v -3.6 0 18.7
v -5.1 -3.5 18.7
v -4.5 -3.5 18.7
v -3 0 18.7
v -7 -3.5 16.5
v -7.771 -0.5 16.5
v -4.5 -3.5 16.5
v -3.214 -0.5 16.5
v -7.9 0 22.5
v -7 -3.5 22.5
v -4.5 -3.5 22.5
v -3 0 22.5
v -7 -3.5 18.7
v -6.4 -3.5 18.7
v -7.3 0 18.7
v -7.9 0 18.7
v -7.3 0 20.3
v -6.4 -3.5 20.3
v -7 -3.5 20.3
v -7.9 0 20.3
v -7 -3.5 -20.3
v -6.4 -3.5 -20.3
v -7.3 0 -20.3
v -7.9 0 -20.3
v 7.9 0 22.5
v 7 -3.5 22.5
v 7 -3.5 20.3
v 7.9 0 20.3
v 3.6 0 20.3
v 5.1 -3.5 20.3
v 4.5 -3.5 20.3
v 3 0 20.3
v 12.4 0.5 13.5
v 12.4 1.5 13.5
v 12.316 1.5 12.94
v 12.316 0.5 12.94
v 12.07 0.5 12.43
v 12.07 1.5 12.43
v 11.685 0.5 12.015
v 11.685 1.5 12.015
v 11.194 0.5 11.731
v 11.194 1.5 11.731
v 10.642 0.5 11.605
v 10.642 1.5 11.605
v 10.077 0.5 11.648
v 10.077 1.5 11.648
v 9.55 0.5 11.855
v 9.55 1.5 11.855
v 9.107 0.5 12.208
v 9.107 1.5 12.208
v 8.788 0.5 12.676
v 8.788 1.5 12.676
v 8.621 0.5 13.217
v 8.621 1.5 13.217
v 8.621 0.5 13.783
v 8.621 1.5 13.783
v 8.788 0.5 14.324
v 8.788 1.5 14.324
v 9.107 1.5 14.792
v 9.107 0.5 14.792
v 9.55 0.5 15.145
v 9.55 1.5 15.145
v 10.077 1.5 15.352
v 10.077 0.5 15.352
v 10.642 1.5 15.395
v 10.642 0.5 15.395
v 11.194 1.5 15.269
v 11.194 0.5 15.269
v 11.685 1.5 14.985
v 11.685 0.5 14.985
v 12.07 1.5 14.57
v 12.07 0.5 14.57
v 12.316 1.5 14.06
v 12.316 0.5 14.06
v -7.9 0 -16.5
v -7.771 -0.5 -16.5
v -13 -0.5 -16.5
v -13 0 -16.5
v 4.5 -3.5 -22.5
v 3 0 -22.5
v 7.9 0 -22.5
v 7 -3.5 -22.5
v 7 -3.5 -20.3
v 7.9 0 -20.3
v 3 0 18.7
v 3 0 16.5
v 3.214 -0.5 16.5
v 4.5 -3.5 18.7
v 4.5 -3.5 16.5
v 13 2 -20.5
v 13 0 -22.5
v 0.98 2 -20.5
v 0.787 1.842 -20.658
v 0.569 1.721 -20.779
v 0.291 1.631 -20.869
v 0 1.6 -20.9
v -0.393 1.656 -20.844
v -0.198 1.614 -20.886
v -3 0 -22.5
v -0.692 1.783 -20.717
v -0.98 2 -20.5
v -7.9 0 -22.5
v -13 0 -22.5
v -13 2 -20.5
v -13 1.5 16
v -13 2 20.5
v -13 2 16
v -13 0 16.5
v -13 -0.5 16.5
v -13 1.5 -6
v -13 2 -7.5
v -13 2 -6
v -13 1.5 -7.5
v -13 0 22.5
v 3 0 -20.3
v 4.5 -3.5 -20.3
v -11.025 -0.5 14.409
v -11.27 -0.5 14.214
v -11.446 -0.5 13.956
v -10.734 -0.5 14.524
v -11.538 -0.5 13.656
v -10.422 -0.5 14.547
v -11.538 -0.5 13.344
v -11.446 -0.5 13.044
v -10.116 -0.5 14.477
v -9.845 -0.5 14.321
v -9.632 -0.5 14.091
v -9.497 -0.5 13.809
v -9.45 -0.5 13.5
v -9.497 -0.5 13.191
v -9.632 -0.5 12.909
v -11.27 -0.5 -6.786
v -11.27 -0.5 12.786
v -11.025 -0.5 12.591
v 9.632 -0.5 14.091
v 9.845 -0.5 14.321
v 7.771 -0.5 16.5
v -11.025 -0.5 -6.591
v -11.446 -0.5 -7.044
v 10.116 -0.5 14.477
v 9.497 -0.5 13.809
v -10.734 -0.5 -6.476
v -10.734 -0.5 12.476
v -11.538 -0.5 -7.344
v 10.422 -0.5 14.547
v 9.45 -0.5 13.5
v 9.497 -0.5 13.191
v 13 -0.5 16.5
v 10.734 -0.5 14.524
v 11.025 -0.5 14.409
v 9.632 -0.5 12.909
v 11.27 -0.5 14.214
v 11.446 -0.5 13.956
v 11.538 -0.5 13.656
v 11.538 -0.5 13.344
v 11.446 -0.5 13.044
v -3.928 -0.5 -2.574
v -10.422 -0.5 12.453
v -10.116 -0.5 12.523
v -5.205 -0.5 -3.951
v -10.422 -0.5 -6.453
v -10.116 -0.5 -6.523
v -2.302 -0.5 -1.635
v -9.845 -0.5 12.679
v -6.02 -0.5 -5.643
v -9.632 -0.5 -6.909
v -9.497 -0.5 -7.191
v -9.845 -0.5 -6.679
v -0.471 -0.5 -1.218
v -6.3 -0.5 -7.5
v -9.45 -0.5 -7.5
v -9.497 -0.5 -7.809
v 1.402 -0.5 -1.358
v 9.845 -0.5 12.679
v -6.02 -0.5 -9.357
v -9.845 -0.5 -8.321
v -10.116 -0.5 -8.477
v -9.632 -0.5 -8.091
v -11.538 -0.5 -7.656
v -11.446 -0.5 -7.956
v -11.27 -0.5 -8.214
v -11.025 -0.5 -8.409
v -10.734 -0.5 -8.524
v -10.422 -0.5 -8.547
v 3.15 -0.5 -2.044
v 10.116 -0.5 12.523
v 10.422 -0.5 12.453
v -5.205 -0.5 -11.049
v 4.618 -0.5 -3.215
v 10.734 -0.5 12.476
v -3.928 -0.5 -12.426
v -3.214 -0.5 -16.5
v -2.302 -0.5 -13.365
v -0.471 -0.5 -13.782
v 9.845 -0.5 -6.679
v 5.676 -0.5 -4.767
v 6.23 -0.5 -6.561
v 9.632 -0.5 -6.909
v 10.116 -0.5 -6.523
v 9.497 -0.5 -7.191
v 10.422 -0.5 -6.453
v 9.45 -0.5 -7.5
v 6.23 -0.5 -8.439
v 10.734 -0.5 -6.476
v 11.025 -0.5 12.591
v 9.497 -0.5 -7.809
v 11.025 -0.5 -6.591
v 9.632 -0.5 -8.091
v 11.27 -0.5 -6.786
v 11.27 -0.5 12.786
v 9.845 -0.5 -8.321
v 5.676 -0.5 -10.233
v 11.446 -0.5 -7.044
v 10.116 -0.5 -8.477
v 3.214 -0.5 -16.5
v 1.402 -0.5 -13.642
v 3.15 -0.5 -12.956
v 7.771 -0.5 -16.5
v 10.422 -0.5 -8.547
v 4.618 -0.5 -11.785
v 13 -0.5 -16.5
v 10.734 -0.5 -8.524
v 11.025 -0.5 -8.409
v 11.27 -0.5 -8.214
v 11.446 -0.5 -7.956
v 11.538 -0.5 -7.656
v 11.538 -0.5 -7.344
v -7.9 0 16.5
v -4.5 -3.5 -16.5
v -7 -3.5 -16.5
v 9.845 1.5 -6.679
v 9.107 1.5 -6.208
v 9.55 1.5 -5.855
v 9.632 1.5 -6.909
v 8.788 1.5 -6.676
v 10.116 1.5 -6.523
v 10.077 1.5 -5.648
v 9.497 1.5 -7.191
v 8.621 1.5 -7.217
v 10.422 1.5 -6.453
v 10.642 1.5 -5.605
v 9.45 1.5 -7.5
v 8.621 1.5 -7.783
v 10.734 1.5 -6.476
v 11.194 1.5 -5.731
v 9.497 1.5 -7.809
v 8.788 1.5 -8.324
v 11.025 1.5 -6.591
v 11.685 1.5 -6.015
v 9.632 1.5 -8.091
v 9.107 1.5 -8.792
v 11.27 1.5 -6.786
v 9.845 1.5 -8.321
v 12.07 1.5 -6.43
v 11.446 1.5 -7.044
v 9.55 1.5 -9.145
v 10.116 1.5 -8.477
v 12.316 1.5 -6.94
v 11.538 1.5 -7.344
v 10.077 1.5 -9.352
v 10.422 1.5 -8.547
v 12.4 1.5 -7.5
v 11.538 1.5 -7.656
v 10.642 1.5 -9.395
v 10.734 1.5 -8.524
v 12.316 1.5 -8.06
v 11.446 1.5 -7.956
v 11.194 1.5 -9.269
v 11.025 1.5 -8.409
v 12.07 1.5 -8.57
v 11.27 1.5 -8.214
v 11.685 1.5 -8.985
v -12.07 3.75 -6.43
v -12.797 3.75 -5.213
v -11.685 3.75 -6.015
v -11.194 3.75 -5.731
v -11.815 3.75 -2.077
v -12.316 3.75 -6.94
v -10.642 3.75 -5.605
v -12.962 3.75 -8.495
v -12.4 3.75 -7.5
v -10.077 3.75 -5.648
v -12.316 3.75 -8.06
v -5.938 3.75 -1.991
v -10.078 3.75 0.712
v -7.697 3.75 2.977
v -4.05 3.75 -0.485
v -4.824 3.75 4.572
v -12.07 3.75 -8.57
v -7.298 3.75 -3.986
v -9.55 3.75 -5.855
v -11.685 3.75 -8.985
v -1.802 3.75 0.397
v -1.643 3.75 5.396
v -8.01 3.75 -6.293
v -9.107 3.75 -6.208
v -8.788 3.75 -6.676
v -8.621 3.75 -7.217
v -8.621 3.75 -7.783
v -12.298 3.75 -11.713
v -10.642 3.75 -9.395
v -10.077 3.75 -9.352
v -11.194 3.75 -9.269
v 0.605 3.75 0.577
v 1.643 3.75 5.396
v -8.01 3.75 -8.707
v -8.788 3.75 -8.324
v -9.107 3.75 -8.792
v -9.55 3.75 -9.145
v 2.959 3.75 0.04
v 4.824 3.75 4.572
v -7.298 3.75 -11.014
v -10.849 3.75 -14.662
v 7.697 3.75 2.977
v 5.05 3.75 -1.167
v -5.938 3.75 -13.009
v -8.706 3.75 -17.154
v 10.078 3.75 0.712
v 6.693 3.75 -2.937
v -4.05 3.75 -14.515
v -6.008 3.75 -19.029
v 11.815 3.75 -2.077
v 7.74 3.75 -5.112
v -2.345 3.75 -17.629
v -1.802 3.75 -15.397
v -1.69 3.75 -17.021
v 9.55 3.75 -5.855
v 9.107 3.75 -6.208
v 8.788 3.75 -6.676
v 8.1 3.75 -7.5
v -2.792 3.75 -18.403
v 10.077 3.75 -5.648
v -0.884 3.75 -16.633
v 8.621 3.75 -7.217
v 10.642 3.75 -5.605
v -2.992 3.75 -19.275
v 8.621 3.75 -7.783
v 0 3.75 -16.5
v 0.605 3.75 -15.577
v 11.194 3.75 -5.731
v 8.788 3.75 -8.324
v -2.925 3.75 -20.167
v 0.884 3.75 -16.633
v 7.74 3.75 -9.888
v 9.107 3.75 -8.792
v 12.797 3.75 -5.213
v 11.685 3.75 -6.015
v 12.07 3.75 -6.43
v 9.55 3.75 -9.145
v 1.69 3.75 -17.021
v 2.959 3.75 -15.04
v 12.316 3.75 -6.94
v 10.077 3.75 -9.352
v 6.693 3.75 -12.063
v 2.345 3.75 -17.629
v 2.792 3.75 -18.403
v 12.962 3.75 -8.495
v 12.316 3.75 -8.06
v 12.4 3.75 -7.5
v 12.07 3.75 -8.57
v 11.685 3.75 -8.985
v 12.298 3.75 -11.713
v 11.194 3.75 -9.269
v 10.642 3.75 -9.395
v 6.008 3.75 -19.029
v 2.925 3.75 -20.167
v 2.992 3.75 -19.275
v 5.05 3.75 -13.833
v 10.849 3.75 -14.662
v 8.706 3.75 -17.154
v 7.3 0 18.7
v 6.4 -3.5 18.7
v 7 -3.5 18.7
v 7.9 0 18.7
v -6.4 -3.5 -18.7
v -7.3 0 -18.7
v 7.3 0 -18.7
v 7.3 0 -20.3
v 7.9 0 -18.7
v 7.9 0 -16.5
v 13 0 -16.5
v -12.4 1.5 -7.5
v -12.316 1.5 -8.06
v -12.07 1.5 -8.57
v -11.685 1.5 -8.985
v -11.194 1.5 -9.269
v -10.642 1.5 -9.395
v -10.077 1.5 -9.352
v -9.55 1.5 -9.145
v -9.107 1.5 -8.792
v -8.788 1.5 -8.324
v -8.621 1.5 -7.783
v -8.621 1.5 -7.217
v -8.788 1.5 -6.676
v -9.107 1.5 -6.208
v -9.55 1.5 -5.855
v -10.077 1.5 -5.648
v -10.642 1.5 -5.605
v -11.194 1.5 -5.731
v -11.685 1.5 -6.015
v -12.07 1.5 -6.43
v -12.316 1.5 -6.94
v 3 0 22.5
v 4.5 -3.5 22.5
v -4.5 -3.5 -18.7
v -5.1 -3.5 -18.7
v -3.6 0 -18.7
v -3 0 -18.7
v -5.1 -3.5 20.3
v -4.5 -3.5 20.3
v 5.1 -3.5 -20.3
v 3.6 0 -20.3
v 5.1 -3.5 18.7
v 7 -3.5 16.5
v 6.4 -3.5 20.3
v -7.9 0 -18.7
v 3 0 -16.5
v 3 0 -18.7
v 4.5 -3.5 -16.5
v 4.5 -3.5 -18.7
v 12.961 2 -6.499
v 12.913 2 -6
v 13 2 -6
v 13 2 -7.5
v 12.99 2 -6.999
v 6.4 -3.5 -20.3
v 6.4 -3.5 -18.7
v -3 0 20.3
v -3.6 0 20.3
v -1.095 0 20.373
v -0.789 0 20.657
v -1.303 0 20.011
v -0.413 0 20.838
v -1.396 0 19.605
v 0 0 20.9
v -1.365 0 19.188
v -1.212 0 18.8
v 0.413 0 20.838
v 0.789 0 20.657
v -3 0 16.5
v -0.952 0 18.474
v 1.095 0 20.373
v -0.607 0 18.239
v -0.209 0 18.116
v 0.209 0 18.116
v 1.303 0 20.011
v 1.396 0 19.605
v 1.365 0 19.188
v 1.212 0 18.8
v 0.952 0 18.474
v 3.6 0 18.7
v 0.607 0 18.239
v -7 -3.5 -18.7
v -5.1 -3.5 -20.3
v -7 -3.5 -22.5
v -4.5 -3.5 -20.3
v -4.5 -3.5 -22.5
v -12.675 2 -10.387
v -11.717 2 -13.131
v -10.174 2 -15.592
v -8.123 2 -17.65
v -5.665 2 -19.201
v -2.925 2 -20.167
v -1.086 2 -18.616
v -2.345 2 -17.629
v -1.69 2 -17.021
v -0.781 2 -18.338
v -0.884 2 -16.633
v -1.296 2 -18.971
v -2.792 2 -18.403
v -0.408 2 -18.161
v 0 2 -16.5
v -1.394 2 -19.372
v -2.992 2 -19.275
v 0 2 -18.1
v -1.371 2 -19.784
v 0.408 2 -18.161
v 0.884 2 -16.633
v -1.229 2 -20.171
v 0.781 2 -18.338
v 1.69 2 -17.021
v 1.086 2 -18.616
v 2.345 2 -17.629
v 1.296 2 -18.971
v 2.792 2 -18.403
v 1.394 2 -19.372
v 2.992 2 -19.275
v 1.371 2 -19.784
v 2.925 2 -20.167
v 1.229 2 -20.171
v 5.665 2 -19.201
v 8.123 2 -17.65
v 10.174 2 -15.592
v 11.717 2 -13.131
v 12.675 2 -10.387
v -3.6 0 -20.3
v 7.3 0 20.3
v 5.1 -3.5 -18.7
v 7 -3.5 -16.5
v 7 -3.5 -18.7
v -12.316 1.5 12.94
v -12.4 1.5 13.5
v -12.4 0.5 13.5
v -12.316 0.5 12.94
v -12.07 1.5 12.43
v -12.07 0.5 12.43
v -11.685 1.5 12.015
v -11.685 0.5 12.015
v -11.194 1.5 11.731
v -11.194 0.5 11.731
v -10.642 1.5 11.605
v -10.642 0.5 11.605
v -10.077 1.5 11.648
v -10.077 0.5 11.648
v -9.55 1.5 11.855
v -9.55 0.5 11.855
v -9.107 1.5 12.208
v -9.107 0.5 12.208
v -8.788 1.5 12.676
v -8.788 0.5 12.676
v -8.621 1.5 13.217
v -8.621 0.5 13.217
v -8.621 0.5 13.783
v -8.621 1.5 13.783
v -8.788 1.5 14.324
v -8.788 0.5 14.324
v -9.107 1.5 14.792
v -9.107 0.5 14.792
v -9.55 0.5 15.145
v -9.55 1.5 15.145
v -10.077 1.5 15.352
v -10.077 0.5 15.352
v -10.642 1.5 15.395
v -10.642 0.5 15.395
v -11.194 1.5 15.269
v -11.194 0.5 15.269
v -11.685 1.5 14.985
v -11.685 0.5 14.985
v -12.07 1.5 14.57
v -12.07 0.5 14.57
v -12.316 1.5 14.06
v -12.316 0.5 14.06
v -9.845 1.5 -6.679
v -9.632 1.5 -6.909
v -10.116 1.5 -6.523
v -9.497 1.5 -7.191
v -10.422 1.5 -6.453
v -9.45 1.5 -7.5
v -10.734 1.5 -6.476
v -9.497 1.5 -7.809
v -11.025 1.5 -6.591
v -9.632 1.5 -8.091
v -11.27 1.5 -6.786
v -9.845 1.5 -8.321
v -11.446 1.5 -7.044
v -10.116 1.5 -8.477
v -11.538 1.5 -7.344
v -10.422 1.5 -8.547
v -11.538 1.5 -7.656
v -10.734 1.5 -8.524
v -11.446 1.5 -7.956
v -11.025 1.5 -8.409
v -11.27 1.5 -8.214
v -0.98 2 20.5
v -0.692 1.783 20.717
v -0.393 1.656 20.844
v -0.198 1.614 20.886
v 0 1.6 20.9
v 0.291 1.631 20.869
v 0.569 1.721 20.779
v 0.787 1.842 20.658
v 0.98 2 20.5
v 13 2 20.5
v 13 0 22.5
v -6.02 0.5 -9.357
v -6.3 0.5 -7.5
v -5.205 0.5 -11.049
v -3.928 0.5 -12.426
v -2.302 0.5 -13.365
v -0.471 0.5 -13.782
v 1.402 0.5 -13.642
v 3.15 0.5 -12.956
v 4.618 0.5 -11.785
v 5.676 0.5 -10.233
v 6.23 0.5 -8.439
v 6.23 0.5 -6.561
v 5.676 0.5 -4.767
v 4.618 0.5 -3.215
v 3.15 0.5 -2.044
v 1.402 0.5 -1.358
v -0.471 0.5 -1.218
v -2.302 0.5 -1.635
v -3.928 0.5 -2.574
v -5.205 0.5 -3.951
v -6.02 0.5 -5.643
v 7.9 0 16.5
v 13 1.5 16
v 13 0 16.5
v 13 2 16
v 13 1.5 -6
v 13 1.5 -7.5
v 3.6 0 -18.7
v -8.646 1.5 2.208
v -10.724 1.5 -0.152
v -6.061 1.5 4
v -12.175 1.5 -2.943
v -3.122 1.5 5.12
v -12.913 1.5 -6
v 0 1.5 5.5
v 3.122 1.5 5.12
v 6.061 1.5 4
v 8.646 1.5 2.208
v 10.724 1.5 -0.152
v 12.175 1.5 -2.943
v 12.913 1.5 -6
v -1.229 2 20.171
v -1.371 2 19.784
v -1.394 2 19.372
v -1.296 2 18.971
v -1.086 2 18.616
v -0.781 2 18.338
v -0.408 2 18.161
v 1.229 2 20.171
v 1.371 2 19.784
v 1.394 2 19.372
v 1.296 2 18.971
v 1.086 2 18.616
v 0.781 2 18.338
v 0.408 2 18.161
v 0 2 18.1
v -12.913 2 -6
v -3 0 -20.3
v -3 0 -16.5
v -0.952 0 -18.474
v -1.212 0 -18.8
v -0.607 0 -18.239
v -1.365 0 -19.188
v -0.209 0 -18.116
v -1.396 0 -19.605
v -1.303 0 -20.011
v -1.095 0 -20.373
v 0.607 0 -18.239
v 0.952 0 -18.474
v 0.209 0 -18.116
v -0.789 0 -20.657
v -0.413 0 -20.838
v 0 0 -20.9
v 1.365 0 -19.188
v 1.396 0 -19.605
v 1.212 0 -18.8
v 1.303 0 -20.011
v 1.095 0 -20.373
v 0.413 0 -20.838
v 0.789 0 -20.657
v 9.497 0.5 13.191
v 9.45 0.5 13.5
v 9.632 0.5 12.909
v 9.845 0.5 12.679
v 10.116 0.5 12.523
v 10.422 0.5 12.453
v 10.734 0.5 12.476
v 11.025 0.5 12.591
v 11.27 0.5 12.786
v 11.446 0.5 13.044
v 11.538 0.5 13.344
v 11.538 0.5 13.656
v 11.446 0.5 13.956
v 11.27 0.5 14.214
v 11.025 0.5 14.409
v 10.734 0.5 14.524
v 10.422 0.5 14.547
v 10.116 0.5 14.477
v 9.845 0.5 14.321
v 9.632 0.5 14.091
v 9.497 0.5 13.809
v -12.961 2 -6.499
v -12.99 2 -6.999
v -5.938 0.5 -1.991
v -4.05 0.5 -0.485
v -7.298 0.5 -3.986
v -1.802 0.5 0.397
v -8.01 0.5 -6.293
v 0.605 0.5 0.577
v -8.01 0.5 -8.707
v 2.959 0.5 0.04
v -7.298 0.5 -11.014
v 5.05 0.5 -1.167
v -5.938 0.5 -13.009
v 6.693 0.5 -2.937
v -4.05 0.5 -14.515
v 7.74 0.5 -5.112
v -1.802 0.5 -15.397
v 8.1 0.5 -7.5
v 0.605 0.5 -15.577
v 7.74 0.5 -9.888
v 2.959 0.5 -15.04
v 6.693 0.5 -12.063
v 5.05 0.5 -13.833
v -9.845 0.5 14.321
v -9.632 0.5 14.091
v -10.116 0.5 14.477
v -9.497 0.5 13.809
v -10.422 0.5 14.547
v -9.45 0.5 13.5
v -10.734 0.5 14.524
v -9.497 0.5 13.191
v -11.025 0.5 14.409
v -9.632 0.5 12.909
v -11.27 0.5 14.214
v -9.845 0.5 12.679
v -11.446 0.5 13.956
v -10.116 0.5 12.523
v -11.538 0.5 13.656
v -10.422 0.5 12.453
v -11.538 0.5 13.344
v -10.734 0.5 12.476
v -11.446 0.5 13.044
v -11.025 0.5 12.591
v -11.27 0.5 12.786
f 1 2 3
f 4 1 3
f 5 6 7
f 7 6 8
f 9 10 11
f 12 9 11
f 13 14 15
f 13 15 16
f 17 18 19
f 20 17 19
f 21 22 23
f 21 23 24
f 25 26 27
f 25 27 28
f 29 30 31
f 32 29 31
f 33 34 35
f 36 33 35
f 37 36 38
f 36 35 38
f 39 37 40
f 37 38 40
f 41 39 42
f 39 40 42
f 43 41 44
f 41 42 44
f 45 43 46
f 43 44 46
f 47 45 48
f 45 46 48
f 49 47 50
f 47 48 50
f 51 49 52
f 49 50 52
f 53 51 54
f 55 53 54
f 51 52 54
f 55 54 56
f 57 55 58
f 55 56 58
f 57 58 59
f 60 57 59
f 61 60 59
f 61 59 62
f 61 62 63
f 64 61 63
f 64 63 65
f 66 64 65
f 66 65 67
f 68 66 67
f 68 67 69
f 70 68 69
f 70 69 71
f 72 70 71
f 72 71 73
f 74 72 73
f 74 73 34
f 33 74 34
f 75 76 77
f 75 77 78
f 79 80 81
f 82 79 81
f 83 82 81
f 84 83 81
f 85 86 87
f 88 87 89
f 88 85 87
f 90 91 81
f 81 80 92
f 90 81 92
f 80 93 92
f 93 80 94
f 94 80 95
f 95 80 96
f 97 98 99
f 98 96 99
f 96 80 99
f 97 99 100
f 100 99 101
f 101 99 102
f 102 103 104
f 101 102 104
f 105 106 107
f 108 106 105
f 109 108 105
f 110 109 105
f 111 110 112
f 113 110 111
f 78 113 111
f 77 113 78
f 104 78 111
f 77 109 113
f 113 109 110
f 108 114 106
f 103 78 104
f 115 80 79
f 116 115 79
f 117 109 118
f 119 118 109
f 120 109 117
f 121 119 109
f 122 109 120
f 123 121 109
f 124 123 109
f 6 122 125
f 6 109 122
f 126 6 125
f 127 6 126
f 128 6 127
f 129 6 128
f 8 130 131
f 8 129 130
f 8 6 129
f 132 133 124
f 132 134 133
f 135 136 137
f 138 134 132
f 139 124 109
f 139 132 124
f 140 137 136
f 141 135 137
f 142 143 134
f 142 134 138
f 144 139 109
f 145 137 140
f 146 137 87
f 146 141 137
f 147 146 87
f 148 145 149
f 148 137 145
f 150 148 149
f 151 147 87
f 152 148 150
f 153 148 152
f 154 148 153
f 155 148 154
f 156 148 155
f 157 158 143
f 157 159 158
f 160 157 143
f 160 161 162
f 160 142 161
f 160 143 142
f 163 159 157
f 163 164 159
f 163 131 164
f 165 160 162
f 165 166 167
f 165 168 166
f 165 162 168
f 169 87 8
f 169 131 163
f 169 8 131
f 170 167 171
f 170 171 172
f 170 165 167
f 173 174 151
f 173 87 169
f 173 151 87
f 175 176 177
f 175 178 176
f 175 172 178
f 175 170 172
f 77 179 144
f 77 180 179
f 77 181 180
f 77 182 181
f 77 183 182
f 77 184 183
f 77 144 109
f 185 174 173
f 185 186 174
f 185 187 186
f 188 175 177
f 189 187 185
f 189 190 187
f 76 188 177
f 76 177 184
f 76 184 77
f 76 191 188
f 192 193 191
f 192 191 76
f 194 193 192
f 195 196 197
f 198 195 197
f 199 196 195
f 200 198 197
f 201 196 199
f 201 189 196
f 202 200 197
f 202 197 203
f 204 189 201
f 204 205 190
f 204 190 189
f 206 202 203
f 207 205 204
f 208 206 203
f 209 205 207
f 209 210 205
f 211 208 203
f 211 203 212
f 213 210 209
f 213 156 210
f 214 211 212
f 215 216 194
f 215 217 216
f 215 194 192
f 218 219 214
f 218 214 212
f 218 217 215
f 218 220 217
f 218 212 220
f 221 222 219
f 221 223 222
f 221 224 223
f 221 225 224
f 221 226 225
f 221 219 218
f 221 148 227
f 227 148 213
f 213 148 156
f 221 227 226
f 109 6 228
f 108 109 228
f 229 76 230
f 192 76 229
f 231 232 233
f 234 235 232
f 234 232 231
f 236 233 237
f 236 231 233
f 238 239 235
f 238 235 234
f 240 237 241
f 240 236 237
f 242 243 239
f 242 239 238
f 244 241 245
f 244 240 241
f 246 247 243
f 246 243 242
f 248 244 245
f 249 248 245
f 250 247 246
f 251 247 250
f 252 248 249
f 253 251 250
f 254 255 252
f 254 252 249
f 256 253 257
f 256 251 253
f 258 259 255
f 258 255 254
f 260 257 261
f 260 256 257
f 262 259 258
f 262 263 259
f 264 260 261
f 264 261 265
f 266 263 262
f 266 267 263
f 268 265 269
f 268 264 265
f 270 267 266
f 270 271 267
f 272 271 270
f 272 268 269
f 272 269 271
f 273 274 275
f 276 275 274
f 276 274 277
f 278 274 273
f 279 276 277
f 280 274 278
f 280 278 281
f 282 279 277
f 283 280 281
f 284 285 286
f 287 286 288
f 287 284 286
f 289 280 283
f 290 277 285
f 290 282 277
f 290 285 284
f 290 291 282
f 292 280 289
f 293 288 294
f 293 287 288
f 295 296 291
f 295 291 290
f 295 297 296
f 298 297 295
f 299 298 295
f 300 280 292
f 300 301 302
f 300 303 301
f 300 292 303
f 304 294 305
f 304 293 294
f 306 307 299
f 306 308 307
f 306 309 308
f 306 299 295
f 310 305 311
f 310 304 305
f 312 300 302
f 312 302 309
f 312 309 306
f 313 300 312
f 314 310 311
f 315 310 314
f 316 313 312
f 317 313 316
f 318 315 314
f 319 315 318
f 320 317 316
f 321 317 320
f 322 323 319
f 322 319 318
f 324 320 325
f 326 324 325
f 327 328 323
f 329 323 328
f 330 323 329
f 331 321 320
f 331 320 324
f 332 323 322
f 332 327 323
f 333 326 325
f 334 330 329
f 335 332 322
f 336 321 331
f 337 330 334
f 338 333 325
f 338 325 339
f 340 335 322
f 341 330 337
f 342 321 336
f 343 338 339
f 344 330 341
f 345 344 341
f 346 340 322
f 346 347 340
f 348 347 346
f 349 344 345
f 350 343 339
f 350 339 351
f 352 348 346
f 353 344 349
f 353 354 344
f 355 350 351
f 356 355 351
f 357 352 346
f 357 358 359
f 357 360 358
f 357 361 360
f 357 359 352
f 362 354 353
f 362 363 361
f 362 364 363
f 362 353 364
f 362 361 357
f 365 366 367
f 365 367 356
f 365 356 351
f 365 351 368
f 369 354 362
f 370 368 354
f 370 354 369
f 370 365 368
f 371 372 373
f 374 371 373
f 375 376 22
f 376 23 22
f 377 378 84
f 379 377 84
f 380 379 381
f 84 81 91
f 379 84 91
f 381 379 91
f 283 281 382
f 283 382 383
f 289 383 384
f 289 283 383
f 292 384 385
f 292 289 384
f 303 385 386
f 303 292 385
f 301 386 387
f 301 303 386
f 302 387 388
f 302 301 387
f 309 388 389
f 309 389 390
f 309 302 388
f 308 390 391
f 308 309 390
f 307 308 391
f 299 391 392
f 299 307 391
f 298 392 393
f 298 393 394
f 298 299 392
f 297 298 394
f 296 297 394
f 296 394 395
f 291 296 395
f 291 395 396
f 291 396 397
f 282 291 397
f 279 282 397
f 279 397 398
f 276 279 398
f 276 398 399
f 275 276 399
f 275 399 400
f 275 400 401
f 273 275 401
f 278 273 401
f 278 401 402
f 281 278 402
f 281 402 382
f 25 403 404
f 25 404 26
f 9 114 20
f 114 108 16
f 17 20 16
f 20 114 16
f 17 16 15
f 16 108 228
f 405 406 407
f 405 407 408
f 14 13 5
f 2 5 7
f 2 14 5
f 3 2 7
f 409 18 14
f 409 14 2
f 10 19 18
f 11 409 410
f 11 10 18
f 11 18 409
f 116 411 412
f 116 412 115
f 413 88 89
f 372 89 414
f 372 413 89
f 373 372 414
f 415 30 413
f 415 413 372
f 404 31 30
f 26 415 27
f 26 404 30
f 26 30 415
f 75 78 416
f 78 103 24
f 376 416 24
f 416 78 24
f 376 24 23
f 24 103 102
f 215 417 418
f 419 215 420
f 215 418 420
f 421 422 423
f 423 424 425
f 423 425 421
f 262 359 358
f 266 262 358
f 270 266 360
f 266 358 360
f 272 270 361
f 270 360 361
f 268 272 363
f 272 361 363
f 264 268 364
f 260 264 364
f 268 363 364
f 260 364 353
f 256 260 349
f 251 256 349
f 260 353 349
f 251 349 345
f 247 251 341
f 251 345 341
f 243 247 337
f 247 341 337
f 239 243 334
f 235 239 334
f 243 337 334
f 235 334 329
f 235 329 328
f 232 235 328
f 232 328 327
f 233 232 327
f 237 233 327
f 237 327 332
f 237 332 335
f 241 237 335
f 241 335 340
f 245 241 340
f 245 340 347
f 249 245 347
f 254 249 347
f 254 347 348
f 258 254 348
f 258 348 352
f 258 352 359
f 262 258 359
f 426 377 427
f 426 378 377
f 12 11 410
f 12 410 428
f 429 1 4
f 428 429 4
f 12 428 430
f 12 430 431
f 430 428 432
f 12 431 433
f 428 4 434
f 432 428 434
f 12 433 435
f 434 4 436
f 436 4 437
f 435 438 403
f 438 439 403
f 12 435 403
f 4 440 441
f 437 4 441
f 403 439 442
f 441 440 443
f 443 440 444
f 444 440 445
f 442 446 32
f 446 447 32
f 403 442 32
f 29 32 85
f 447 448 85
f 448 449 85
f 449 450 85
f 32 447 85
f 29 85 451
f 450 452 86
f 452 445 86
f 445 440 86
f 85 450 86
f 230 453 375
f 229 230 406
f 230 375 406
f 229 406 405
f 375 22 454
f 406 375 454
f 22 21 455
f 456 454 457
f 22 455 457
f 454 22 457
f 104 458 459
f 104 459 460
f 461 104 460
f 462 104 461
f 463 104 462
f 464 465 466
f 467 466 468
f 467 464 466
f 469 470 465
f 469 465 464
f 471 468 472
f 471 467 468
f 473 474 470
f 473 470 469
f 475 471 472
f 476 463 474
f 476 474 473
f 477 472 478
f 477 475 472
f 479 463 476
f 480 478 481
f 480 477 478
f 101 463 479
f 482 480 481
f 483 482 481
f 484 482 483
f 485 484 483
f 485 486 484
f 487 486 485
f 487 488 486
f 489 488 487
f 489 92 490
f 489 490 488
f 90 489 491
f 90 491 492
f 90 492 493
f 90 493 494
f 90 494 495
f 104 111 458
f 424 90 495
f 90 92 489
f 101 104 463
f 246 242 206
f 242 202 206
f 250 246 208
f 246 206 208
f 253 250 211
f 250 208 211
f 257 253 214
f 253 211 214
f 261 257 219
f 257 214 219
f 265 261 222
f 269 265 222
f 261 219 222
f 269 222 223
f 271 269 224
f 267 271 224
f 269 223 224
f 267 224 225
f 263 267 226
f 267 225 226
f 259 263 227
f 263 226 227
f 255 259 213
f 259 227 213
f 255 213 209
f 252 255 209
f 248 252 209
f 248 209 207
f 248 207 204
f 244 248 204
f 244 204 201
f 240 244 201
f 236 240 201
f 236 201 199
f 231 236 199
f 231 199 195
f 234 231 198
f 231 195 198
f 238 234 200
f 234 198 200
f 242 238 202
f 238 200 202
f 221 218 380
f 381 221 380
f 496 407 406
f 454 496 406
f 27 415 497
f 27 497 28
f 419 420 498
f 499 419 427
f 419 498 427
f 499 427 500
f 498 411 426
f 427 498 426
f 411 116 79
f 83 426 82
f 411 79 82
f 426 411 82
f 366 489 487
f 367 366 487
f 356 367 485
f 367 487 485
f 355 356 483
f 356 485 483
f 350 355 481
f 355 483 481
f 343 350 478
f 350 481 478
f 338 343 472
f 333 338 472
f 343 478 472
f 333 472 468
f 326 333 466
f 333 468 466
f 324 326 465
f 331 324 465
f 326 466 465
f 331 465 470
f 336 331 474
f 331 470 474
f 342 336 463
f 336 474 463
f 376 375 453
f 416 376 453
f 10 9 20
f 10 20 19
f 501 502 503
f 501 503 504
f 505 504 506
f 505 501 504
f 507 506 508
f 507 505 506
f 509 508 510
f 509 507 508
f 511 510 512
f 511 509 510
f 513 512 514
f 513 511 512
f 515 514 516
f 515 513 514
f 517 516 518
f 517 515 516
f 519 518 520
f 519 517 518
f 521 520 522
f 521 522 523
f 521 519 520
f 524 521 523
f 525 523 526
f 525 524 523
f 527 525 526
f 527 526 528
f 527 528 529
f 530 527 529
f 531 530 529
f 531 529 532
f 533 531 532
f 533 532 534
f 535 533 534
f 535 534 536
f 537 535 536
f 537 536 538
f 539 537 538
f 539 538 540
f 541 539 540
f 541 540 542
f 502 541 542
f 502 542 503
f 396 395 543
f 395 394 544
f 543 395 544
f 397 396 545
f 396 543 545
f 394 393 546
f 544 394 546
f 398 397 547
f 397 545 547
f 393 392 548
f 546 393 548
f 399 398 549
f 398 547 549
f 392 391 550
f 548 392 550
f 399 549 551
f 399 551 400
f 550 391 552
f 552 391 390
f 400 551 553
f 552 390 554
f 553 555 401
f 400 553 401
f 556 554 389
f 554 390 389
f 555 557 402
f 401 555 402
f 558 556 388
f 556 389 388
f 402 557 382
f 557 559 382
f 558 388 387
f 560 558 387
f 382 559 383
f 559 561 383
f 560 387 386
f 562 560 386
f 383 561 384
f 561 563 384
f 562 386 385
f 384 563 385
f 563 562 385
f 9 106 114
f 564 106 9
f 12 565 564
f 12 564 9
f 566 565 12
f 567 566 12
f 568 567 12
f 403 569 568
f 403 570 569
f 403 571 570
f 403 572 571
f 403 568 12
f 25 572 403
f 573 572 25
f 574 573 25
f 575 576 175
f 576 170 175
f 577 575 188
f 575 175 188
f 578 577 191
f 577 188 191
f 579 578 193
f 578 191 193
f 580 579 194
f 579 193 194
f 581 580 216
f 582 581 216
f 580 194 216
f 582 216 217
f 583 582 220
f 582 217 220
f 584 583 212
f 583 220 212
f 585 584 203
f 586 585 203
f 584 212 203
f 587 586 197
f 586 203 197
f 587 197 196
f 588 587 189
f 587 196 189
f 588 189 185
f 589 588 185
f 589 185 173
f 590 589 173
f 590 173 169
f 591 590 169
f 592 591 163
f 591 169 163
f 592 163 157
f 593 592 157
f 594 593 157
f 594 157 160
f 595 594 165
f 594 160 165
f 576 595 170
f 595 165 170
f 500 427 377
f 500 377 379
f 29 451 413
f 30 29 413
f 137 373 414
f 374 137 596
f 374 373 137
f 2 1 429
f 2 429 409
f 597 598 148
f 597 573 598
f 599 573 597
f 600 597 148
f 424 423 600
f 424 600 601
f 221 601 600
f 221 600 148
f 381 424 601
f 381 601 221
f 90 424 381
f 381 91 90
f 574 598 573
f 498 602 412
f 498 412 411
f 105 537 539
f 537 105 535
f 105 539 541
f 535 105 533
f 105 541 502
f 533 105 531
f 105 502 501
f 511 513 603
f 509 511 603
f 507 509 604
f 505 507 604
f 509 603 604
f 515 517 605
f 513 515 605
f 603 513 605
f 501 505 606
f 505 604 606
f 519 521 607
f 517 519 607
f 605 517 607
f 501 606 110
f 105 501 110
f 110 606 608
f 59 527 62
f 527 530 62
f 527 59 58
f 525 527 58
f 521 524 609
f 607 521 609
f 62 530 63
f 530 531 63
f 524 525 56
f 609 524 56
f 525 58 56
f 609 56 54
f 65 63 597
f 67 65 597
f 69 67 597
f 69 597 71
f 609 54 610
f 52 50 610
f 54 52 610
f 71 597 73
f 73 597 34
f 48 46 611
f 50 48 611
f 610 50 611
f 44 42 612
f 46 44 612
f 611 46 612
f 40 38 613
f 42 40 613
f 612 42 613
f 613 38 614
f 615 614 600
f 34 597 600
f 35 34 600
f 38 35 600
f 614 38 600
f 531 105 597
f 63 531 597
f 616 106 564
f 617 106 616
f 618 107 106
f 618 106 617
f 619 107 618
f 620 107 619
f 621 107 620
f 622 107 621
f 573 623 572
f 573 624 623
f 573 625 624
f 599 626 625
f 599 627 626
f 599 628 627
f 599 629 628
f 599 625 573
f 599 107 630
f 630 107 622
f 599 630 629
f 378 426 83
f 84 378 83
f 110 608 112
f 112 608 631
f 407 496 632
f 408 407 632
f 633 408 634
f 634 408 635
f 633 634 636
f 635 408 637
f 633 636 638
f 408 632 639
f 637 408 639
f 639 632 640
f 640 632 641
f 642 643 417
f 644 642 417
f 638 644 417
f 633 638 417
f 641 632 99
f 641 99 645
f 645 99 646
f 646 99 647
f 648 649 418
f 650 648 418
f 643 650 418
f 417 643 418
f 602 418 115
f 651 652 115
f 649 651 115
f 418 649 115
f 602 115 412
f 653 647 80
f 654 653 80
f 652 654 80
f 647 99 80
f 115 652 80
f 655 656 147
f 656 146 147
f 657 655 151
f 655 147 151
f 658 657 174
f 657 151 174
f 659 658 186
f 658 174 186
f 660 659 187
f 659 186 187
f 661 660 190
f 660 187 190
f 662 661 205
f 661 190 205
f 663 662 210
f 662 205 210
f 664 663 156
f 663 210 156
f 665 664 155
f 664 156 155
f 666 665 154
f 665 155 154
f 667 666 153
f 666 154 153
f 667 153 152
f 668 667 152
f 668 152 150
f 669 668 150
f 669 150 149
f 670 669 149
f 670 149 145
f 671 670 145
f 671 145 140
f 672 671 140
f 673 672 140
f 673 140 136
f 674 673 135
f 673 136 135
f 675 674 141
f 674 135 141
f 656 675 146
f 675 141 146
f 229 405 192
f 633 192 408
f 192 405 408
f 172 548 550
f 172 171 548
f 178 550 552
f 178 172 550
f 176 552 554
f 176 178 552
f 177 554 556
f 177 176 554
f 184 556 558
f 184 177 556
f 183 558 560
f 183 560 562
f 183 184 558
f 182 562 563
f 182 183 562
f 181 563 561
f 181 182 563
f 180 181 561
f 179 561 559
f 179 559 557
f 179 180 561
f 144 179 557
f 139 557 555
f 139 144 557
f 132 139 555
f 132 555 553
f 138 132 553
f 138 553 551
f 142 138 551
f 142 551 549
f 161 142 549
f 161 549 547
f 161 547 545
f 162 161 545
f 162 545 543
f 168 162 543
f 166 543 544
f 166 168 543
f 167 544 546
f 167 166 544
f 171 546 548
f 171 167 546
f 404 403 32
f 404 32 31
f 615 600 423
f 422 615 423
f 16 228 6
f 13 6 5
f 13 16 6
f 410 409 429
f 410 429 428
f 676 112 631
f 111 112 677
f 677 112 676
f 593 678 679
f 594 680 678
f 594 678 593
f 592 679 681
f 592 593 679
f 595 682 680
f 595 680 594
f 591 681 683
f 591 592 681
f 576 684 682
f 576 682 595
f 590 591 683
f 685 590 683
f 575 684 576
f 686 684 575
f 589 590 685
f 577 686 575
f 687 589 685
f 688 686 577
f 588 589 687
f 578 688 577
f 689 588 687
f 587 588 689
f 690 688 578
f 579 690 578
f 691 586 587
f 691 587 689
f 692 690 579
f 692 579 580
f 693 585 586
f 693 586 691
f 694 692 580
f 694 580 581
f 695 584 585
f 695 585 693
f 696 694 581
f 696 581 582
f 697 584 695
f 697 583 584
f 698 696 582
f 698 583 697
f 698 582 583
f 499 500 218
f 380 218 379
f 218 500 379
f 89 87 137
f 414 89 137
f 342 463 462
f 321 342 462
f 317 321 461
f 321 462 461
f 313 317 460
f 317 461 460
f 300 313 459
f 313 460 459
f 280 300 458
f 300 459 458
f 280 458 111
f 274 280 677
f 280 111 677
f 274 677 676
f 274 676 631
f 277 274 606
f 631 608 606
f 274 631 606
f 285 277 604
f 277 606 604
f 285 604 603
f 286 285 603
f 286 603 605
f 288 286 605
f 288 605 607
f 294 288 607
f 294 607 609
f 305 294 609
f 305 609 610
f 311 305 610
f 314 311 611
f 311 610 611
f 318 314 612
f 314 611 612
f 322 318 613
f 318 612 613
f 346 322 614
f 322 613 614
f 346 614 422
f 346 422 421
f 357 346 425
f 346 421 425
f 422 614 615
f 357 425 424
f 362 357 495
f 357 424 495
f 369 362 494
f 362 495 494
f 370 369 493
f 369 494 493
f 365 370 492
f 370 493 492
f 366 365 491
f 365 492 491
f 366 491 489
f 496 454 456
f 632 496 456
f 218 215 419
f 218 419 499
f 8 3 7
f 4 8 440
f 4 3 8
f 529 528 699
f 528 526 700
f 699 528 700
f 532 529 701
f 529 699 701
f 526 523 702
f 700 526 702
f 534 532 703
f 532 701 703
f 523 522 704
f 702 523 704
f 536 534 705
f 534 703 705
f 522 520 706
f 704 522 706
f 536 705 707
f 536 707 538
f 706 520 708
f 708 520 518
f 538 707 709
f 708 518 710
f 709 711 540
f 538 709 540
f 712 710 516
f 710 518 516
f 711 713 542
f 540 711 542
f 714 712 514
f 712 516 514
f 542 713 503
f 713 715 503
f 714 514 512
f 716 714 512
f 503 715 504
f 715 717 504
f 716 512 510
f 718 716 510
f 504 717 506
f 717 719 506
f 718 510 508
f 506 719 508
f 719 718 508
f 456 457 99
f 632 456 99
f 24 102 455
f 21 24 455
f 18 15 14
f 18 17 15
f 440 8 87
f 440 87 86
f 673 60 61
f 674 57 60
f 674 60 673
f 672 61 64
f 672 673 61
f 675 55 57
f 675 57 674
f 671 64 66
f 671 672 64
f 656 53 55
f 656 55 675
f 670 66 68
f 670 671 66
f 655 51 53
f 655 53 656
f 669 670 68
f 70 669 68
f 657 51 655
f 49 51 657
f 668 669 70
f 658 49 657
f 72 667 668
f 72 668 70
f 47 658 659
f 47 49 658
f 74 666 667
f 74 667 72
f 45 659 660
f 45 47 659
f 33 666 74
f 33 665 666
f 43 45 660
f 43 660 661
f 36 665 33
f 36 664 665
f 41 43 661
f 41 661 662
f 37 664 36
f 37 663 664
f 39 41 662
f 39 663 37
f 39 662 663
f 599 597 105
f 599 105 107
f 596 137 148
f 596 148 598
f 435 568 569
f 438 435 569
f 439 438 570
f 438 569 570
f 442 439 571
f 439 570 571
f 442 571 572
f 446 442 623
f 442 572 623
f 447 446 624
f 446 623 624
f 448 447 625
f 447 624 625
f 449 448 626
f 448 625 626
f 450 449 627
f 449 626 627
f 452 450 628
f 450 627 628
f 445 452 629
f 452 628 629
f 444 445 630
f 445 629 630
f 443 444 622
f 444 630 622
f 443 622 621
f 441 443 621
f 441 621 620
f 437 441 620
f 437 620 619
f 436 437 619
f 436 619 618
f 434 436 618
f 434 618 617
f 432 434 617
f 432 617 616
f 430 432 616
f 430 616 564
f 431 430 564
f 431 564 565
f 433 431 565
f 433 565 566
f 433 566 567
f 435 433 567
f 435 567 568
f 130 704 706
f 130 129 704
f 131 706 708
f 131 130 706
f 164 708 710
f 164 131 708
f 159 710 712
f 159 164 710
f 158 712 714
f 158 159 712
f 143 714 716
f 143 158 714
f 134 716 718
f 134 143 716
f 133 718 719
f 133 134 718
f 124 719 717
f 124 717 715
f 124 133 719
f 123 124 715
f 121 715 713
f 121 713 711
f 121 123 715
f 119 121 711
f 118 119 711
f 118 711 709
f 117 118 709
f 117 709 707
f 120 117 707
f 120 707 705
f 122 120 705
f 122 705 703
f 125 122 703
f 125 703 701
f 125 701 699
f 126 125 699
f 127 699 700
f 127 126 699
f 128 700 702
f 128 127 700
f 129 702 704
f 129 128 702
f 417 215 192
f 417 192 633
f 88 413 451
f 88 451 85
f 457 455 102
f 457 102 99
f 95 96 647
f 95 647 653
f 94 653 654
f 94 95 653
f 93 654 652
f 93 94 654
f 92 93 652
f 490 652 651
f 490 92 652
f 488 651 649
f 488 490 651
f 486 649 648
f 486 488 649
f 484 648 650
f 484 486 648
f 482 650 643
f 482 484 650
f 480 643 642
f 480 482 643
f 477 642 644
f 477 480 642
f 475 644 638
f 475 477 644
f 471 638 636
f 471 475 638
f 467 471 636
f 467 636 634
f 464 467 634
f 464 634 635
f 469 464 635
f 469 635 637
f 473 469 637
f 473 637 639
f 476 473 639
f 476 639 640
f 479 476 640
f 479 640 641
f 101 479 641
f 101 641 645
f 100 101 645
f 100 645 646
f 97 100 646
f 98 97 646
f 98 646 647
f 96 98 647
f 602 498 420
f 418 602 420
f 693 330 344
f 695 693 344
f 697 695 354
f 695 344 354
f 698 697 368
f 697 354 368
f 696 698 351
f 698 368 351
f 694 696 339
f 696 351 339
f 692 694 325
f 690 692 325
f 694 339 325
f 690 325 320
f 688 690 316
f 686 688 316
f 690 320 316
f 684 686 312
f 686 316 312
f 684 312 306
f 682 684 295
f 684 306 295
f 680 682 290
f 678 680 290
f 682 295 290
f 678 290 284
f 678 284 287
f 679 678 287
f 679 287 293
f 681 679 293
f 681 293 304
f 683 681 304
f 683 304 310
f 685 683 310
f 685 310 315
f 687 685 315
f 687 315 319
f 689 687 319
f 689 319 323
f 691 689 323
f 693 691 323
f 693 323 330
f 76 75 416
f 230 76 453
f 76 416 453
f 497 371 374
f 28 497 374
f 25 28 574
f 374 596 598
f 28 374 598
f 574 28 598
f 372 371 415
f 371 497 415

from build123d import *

# Parameters (mm, degrees)
SKETCH_1_W                   = 26
SKETCH_1_H                   = 45
EXTRUDE_1_DEPTH              = 2
EXTRUDE_3_DEPTH              = 6
CUT_EXTRUDE_1_REACH          = 28.561
SKETCH_5_R                   = 1.4
EXTRUDE_4_REACH              = 36.562
SKETCH_6_W                   = 33
SKETCH_6_H                   = 0.5
CUT_EXTRUDE_2_REACH          = 36.562
SKETCH_7_W                   = 22
SKETCH_7_H                   = 0.5
HOLE_WIZARD_M2_1_D           = 2.1
HOLE_WIZARD_M2_1_CBORE_D     = 3.8
HOLE_WIZARD_M2_1_CBORE_DEPTH = 1
CHAMFER_1_SIZE               = 2
EXTRUDE_5_DEPTH              = 2.25
HOLE_WIZARD_M2_2_D           = 2.1
HOLE_WIZARD_M2_2_CBORE_D     = 3.8
HOLE_WIZARD_M2_2_CBORE_DEPTH = 2.25
HOLE_WIZARD_M2_3_D           = 12.6
HOLE_WIZARD_M2_3_CBORE_D     = 16.2
HOLE_WIZARD_M2_3_CBORE_DEPTH = 3.25
CUT_EXTRUDE_3_DEPTH          = 0.8
MIRROR_4_COPY_1_DEPTH        = 0.8


with BuildPart() as part:
    # ｽｹｯﾁ1 → ﾎﾞｽ - 押し出し1 (new body)
    with BuildSketch(Plane(origin=(0, 0, 0), x_dir=(1, 0, 0), z_dir=(0, 1, 0))):
        Rectangle(SKETCH_1_W, SKETCH_1_H)
    extrude(amount=EXTRUDE_1_DEPTH)

    # ｽｹｯﾁ4 → ﾎﾞｽ - 押し出し3 (add)
    with BuildSketch(Plane.XY.offset(22.5)):
        Polygon((-7, -3.5), (-4.5, -3.5), (-3, 0), (-7.9, 0), align=None)
        Polygon((3, 0), (4.5, -3.5), (7, -3.5), (7.9, 0), align=None)
    extrude_3 = extrude(amount=-EXTRUDE_3_DEPTH)

    # ｽｹｯﾁ5 → ｶｯﾄ - 押し出し1 (cut, up to next)
    with BuildSketch(Plane(origin=(0, 2, 0), x_dir=(1, 0, 0), z_dir=(0, 1, 0)), mode=Mode.PRIVATE) as cut_extrude_1_sk1:
        with Locations(Location((0, -19.5, 0), (0, 0, 270))):
            Circle(SKETCH_5_R)
    cut_extrude_1_tool1 = extrude(cut_extrude_1_sk1.sketch, amount=-CUT_EXTRUDE_1_REACH, mode=Mode.PRIVATE) & part.part
    cut_extrude_1 = cut_extrude_1_tool1.solids().sort_by_distance((0, 2, 19.5))[0]
    add(cut_extrude_1, mode=Mode.SUBTRACT)

    # ﾎﾞｽ - 押し出し4: up to this face of the body (flat: up to its plane)
    extrude_4_end = Plane(part.part.faces().sort_by_distance((-13, 1, 0))[0])
    # ｽｹｯﾁ6 → ﾎﾞｽ - 押し出し4 (add, up to the picked face)
    with BuildSketch(Plane(origin=(13, 0, 0), x_dir=(0, 0, -1), z_dir=(1, 0, 0)), mode=Mode.PRIVATE) as extrude_4_sk1:
        with Locations((0, -0.25)):
            Rectangle(SKETCH_6_W, SKETCH_6_H)
    extrude_4_tool1 = split(extrude(extrude_4_sk1.sketch, amount=-EXTRUDE_4_REACH, mode=Mode.PRIVATE), bisect_by=extrude_4_end, keep=Keep.BOTH, mode=Mode.PRIVATE)
    add(extrude_4_tool1.solids().sort_by(Axis((13, -0.25, 0), (-1, 0, 0)))[0])

    # ｽｹｯﾁ7 → ｶｯﾄ - 押し出し2 (cut, up to next)
    with BuildSketch(Plane(origin=(13, 0, 0), x_dir=(0, 0, -1), z_dir=(1, 0, 0)), mode=Mode.PRIVATE) as cut_extrude_2_sk1:
        with Locations((-5, 1.75)):
            Rectangle(SKETCH_7_W, SKETCH_7_H)
    cut_extrude_2_tool1 = extrude(cut_extrude_2_sk1.sketch, amount=-CUT_EXTRUDE_2_REACH, mode=Mode.PRIVATE) & part.part
    add(cut_extrude_2_tool1.solids().sort_by_distance((13, 1.75, 5))[0], mode=Mode.SUBTRACT)

    # M2 丸平ねじ用座ぐり穴1 (through all)
    with Locations(Plane(origin=(0, 1.5, 0), x_dir=(1, 0, 0), z_dir=(0, 1, 0))):
        with Locations((10.5, -13.5)):
            hole_wizard_m2_1 = CounterBoreHole(HOLE_WIZARD_M2_1_D / 2, HOLE_WIZARD_M2_1_CBORE_D / 2, HOLE_WIZARD_M2_1_CBORE_DEPTH)

    # 面取り1
    # the kernel refuses this chamfer: 2 mm, written as the material it takes off along each edge
    with BuildSketch(Plane(origin=(18.143365976, 2, 22.5), x_dir=(0, 0.027495876610586296, -0.9996219169112968), z_dir=(-1, 0, 0))) as chamfer_1_piece_1:
        Polygon((CHAMFER_1_SIZE * 0.999621916911, CHAMFER_1_SIZE * 0.0274958766106), (-CHAMFER_1_SIZE * 0.0274958766106, CHAMFER_1_SIZE * 0.999621916911), (0, 0), align=None)
    extrude(amount=36.286731952, mode=Mode.SUBTRACT)
    with BuildSketch(Plane(origin=(-18.143365976, 2, -22.5), x_dir=(0, -0.9996219169112968, -0.02749587661058563), z_dir=(1, 0, 0))) as chamfer_1_piece_2:
        Polygon((CHAMFER_1_SIZE * 0.999621916911, -CHAMFER_1_SIZE * 0.0274958766106), (-CHAMFER_1_SIZE * 0.0274958766106, -CHAMFER_1_SIZE * 0.999621916911), (0, 0), align=None)
    extrude(amount=36.286731952, mode=Mode.SUBTRACT)

    # ﾐﾗｰ1: ﾎﾞｽ - 押し出し3, ｶｯﾄ - 押し出し1 across plane
    add(extrude_3.mirror(Plane.XY))
    add(cut_extrude_1.mirror(Plane.XY), mode=Mode.SUBTRACT)

    # ｽｹｯﾁ11 → ﾎﾞｽ - 押し出し5 (add)
    with BuildSketch(Plane(origin=(0, 1.5, 0), x_dir=(1, 0, 0), z_dir=(0, 1, 0))):
        with BuildLine():
            ThreePointArc((-2.924988129, 20.166666667), (0, -5.5), (2.924988129, 20.166666667))
            ThreePointArc((2.924988129, 20.166666667), (0, 16.5), (-2.924988129, 20.166666667))
        make_face()
    extrude(amount=EXTRUDE_5_DEPTH)

    # M2 丸平ねじ用座ぐり穴2 (through all)
    with Locations(Plane(origin=(0, 3.75, 0), x_dir=(1, 0, 0), z_dir=(0, 1, 0))):
        with Locations((10.5, 7.5)):
            hole_wizard_m2_2 = CounterBoreHole(HOLE_WIZARD_M2_2_D / 2, HOLE_WIZARD_M2_2_CBORE_D / 2, HOLE_WIZARD_M2_2_CBORE_DEPTH)

    # M2 丸平ねじ用座ぐり穴3 (through all)
    with Locations(Plane(origin=(0, 3.75, 0), x_dir=(1, 0, 0), z_dir=(0, 1, 0))):
        with Locations((0, 7.5)):
            CounterBoreHole(HOLE_WIZARD_M2_3_D / 2, HOLE_WIZARD_M2_3_CBORE_D / 2, HOLE_WIZARD_M2_3_CBORE_DEPTH)

    # ﾐﾗｰ2: M2 丸平ねじ用座ぐり穴1, M2 丸平ねじ用座ぐり穴2 across plane
    add(hole_wizard_m2_1.mirror(Plane(origin=(0, 0, 0), x_dir=(0, 0, 1), z_dir=(1, 0, 0))), mode=Mode.SUBTRACT)
    add(hole_wizard_m2_2.mirror(Plane(origin=(0, 0, 0), x_dir=(0, 0, 1), z_dir=(1, 0, 0))), mode=Mode.SUBTRACT)

    # ｽｹｯﾁ17 → ｶｯﾄ - 押し出し3 (cut, symmetric)
    with BuildSketch(Plane.XY.offset(19.5)):
        Polygon((4.5, -3.5), (3, 0), (3.6, 0), (5.1, -3.5), align=None)
        Polygon((6.4, -3.5), (7, -3.5), (7.9, 0), (7.3, 0), align=None)
    cut_extrude_3 = extrude(amount=CUT_EXTRUDE_3_DEPTH, both=True, mode=Mode.SUBTRACT)

    # ﾐﾗｰ3: ｶｯﾄ - 押し出し3 across plane
    add(cut_extrude_3.mirror(Plane(origin=(0, 0, 0), x_dir=(0, 0, 1), z_dir=(1, 0, 0))), mode=Mode.SUBTRACT)

    # ﾐﾗｰ4: ｶｯﾄ - 押し出し3 across plane
    add(cut_extrude_3.mirror(Plane.XY), mode=Mode.SUBTRACT)

    # ﾐﾗｰ4 copy 1 sketch → ﾐﾗｰ4 copy 1 (cut, symmetric)
    with BuildSketch(Plane(origin=(0, 0, -19.5), x_dir=(-1, 0, 0), z_dir=(0, 0, -1))):
        Polygon((4.5, -3.5), (3, 0), (3.6, 0), (5.1, -3.5), align=None)
        Polygon((6.4, -3.5), (7, -3.5), (7.9, 0), (7.3, 0), align=None)
    extrude(amount=MIRROR_4_COPY_1_DEPTH, both=True, mode=Mode.SUBTRACT)


solid = part.part
